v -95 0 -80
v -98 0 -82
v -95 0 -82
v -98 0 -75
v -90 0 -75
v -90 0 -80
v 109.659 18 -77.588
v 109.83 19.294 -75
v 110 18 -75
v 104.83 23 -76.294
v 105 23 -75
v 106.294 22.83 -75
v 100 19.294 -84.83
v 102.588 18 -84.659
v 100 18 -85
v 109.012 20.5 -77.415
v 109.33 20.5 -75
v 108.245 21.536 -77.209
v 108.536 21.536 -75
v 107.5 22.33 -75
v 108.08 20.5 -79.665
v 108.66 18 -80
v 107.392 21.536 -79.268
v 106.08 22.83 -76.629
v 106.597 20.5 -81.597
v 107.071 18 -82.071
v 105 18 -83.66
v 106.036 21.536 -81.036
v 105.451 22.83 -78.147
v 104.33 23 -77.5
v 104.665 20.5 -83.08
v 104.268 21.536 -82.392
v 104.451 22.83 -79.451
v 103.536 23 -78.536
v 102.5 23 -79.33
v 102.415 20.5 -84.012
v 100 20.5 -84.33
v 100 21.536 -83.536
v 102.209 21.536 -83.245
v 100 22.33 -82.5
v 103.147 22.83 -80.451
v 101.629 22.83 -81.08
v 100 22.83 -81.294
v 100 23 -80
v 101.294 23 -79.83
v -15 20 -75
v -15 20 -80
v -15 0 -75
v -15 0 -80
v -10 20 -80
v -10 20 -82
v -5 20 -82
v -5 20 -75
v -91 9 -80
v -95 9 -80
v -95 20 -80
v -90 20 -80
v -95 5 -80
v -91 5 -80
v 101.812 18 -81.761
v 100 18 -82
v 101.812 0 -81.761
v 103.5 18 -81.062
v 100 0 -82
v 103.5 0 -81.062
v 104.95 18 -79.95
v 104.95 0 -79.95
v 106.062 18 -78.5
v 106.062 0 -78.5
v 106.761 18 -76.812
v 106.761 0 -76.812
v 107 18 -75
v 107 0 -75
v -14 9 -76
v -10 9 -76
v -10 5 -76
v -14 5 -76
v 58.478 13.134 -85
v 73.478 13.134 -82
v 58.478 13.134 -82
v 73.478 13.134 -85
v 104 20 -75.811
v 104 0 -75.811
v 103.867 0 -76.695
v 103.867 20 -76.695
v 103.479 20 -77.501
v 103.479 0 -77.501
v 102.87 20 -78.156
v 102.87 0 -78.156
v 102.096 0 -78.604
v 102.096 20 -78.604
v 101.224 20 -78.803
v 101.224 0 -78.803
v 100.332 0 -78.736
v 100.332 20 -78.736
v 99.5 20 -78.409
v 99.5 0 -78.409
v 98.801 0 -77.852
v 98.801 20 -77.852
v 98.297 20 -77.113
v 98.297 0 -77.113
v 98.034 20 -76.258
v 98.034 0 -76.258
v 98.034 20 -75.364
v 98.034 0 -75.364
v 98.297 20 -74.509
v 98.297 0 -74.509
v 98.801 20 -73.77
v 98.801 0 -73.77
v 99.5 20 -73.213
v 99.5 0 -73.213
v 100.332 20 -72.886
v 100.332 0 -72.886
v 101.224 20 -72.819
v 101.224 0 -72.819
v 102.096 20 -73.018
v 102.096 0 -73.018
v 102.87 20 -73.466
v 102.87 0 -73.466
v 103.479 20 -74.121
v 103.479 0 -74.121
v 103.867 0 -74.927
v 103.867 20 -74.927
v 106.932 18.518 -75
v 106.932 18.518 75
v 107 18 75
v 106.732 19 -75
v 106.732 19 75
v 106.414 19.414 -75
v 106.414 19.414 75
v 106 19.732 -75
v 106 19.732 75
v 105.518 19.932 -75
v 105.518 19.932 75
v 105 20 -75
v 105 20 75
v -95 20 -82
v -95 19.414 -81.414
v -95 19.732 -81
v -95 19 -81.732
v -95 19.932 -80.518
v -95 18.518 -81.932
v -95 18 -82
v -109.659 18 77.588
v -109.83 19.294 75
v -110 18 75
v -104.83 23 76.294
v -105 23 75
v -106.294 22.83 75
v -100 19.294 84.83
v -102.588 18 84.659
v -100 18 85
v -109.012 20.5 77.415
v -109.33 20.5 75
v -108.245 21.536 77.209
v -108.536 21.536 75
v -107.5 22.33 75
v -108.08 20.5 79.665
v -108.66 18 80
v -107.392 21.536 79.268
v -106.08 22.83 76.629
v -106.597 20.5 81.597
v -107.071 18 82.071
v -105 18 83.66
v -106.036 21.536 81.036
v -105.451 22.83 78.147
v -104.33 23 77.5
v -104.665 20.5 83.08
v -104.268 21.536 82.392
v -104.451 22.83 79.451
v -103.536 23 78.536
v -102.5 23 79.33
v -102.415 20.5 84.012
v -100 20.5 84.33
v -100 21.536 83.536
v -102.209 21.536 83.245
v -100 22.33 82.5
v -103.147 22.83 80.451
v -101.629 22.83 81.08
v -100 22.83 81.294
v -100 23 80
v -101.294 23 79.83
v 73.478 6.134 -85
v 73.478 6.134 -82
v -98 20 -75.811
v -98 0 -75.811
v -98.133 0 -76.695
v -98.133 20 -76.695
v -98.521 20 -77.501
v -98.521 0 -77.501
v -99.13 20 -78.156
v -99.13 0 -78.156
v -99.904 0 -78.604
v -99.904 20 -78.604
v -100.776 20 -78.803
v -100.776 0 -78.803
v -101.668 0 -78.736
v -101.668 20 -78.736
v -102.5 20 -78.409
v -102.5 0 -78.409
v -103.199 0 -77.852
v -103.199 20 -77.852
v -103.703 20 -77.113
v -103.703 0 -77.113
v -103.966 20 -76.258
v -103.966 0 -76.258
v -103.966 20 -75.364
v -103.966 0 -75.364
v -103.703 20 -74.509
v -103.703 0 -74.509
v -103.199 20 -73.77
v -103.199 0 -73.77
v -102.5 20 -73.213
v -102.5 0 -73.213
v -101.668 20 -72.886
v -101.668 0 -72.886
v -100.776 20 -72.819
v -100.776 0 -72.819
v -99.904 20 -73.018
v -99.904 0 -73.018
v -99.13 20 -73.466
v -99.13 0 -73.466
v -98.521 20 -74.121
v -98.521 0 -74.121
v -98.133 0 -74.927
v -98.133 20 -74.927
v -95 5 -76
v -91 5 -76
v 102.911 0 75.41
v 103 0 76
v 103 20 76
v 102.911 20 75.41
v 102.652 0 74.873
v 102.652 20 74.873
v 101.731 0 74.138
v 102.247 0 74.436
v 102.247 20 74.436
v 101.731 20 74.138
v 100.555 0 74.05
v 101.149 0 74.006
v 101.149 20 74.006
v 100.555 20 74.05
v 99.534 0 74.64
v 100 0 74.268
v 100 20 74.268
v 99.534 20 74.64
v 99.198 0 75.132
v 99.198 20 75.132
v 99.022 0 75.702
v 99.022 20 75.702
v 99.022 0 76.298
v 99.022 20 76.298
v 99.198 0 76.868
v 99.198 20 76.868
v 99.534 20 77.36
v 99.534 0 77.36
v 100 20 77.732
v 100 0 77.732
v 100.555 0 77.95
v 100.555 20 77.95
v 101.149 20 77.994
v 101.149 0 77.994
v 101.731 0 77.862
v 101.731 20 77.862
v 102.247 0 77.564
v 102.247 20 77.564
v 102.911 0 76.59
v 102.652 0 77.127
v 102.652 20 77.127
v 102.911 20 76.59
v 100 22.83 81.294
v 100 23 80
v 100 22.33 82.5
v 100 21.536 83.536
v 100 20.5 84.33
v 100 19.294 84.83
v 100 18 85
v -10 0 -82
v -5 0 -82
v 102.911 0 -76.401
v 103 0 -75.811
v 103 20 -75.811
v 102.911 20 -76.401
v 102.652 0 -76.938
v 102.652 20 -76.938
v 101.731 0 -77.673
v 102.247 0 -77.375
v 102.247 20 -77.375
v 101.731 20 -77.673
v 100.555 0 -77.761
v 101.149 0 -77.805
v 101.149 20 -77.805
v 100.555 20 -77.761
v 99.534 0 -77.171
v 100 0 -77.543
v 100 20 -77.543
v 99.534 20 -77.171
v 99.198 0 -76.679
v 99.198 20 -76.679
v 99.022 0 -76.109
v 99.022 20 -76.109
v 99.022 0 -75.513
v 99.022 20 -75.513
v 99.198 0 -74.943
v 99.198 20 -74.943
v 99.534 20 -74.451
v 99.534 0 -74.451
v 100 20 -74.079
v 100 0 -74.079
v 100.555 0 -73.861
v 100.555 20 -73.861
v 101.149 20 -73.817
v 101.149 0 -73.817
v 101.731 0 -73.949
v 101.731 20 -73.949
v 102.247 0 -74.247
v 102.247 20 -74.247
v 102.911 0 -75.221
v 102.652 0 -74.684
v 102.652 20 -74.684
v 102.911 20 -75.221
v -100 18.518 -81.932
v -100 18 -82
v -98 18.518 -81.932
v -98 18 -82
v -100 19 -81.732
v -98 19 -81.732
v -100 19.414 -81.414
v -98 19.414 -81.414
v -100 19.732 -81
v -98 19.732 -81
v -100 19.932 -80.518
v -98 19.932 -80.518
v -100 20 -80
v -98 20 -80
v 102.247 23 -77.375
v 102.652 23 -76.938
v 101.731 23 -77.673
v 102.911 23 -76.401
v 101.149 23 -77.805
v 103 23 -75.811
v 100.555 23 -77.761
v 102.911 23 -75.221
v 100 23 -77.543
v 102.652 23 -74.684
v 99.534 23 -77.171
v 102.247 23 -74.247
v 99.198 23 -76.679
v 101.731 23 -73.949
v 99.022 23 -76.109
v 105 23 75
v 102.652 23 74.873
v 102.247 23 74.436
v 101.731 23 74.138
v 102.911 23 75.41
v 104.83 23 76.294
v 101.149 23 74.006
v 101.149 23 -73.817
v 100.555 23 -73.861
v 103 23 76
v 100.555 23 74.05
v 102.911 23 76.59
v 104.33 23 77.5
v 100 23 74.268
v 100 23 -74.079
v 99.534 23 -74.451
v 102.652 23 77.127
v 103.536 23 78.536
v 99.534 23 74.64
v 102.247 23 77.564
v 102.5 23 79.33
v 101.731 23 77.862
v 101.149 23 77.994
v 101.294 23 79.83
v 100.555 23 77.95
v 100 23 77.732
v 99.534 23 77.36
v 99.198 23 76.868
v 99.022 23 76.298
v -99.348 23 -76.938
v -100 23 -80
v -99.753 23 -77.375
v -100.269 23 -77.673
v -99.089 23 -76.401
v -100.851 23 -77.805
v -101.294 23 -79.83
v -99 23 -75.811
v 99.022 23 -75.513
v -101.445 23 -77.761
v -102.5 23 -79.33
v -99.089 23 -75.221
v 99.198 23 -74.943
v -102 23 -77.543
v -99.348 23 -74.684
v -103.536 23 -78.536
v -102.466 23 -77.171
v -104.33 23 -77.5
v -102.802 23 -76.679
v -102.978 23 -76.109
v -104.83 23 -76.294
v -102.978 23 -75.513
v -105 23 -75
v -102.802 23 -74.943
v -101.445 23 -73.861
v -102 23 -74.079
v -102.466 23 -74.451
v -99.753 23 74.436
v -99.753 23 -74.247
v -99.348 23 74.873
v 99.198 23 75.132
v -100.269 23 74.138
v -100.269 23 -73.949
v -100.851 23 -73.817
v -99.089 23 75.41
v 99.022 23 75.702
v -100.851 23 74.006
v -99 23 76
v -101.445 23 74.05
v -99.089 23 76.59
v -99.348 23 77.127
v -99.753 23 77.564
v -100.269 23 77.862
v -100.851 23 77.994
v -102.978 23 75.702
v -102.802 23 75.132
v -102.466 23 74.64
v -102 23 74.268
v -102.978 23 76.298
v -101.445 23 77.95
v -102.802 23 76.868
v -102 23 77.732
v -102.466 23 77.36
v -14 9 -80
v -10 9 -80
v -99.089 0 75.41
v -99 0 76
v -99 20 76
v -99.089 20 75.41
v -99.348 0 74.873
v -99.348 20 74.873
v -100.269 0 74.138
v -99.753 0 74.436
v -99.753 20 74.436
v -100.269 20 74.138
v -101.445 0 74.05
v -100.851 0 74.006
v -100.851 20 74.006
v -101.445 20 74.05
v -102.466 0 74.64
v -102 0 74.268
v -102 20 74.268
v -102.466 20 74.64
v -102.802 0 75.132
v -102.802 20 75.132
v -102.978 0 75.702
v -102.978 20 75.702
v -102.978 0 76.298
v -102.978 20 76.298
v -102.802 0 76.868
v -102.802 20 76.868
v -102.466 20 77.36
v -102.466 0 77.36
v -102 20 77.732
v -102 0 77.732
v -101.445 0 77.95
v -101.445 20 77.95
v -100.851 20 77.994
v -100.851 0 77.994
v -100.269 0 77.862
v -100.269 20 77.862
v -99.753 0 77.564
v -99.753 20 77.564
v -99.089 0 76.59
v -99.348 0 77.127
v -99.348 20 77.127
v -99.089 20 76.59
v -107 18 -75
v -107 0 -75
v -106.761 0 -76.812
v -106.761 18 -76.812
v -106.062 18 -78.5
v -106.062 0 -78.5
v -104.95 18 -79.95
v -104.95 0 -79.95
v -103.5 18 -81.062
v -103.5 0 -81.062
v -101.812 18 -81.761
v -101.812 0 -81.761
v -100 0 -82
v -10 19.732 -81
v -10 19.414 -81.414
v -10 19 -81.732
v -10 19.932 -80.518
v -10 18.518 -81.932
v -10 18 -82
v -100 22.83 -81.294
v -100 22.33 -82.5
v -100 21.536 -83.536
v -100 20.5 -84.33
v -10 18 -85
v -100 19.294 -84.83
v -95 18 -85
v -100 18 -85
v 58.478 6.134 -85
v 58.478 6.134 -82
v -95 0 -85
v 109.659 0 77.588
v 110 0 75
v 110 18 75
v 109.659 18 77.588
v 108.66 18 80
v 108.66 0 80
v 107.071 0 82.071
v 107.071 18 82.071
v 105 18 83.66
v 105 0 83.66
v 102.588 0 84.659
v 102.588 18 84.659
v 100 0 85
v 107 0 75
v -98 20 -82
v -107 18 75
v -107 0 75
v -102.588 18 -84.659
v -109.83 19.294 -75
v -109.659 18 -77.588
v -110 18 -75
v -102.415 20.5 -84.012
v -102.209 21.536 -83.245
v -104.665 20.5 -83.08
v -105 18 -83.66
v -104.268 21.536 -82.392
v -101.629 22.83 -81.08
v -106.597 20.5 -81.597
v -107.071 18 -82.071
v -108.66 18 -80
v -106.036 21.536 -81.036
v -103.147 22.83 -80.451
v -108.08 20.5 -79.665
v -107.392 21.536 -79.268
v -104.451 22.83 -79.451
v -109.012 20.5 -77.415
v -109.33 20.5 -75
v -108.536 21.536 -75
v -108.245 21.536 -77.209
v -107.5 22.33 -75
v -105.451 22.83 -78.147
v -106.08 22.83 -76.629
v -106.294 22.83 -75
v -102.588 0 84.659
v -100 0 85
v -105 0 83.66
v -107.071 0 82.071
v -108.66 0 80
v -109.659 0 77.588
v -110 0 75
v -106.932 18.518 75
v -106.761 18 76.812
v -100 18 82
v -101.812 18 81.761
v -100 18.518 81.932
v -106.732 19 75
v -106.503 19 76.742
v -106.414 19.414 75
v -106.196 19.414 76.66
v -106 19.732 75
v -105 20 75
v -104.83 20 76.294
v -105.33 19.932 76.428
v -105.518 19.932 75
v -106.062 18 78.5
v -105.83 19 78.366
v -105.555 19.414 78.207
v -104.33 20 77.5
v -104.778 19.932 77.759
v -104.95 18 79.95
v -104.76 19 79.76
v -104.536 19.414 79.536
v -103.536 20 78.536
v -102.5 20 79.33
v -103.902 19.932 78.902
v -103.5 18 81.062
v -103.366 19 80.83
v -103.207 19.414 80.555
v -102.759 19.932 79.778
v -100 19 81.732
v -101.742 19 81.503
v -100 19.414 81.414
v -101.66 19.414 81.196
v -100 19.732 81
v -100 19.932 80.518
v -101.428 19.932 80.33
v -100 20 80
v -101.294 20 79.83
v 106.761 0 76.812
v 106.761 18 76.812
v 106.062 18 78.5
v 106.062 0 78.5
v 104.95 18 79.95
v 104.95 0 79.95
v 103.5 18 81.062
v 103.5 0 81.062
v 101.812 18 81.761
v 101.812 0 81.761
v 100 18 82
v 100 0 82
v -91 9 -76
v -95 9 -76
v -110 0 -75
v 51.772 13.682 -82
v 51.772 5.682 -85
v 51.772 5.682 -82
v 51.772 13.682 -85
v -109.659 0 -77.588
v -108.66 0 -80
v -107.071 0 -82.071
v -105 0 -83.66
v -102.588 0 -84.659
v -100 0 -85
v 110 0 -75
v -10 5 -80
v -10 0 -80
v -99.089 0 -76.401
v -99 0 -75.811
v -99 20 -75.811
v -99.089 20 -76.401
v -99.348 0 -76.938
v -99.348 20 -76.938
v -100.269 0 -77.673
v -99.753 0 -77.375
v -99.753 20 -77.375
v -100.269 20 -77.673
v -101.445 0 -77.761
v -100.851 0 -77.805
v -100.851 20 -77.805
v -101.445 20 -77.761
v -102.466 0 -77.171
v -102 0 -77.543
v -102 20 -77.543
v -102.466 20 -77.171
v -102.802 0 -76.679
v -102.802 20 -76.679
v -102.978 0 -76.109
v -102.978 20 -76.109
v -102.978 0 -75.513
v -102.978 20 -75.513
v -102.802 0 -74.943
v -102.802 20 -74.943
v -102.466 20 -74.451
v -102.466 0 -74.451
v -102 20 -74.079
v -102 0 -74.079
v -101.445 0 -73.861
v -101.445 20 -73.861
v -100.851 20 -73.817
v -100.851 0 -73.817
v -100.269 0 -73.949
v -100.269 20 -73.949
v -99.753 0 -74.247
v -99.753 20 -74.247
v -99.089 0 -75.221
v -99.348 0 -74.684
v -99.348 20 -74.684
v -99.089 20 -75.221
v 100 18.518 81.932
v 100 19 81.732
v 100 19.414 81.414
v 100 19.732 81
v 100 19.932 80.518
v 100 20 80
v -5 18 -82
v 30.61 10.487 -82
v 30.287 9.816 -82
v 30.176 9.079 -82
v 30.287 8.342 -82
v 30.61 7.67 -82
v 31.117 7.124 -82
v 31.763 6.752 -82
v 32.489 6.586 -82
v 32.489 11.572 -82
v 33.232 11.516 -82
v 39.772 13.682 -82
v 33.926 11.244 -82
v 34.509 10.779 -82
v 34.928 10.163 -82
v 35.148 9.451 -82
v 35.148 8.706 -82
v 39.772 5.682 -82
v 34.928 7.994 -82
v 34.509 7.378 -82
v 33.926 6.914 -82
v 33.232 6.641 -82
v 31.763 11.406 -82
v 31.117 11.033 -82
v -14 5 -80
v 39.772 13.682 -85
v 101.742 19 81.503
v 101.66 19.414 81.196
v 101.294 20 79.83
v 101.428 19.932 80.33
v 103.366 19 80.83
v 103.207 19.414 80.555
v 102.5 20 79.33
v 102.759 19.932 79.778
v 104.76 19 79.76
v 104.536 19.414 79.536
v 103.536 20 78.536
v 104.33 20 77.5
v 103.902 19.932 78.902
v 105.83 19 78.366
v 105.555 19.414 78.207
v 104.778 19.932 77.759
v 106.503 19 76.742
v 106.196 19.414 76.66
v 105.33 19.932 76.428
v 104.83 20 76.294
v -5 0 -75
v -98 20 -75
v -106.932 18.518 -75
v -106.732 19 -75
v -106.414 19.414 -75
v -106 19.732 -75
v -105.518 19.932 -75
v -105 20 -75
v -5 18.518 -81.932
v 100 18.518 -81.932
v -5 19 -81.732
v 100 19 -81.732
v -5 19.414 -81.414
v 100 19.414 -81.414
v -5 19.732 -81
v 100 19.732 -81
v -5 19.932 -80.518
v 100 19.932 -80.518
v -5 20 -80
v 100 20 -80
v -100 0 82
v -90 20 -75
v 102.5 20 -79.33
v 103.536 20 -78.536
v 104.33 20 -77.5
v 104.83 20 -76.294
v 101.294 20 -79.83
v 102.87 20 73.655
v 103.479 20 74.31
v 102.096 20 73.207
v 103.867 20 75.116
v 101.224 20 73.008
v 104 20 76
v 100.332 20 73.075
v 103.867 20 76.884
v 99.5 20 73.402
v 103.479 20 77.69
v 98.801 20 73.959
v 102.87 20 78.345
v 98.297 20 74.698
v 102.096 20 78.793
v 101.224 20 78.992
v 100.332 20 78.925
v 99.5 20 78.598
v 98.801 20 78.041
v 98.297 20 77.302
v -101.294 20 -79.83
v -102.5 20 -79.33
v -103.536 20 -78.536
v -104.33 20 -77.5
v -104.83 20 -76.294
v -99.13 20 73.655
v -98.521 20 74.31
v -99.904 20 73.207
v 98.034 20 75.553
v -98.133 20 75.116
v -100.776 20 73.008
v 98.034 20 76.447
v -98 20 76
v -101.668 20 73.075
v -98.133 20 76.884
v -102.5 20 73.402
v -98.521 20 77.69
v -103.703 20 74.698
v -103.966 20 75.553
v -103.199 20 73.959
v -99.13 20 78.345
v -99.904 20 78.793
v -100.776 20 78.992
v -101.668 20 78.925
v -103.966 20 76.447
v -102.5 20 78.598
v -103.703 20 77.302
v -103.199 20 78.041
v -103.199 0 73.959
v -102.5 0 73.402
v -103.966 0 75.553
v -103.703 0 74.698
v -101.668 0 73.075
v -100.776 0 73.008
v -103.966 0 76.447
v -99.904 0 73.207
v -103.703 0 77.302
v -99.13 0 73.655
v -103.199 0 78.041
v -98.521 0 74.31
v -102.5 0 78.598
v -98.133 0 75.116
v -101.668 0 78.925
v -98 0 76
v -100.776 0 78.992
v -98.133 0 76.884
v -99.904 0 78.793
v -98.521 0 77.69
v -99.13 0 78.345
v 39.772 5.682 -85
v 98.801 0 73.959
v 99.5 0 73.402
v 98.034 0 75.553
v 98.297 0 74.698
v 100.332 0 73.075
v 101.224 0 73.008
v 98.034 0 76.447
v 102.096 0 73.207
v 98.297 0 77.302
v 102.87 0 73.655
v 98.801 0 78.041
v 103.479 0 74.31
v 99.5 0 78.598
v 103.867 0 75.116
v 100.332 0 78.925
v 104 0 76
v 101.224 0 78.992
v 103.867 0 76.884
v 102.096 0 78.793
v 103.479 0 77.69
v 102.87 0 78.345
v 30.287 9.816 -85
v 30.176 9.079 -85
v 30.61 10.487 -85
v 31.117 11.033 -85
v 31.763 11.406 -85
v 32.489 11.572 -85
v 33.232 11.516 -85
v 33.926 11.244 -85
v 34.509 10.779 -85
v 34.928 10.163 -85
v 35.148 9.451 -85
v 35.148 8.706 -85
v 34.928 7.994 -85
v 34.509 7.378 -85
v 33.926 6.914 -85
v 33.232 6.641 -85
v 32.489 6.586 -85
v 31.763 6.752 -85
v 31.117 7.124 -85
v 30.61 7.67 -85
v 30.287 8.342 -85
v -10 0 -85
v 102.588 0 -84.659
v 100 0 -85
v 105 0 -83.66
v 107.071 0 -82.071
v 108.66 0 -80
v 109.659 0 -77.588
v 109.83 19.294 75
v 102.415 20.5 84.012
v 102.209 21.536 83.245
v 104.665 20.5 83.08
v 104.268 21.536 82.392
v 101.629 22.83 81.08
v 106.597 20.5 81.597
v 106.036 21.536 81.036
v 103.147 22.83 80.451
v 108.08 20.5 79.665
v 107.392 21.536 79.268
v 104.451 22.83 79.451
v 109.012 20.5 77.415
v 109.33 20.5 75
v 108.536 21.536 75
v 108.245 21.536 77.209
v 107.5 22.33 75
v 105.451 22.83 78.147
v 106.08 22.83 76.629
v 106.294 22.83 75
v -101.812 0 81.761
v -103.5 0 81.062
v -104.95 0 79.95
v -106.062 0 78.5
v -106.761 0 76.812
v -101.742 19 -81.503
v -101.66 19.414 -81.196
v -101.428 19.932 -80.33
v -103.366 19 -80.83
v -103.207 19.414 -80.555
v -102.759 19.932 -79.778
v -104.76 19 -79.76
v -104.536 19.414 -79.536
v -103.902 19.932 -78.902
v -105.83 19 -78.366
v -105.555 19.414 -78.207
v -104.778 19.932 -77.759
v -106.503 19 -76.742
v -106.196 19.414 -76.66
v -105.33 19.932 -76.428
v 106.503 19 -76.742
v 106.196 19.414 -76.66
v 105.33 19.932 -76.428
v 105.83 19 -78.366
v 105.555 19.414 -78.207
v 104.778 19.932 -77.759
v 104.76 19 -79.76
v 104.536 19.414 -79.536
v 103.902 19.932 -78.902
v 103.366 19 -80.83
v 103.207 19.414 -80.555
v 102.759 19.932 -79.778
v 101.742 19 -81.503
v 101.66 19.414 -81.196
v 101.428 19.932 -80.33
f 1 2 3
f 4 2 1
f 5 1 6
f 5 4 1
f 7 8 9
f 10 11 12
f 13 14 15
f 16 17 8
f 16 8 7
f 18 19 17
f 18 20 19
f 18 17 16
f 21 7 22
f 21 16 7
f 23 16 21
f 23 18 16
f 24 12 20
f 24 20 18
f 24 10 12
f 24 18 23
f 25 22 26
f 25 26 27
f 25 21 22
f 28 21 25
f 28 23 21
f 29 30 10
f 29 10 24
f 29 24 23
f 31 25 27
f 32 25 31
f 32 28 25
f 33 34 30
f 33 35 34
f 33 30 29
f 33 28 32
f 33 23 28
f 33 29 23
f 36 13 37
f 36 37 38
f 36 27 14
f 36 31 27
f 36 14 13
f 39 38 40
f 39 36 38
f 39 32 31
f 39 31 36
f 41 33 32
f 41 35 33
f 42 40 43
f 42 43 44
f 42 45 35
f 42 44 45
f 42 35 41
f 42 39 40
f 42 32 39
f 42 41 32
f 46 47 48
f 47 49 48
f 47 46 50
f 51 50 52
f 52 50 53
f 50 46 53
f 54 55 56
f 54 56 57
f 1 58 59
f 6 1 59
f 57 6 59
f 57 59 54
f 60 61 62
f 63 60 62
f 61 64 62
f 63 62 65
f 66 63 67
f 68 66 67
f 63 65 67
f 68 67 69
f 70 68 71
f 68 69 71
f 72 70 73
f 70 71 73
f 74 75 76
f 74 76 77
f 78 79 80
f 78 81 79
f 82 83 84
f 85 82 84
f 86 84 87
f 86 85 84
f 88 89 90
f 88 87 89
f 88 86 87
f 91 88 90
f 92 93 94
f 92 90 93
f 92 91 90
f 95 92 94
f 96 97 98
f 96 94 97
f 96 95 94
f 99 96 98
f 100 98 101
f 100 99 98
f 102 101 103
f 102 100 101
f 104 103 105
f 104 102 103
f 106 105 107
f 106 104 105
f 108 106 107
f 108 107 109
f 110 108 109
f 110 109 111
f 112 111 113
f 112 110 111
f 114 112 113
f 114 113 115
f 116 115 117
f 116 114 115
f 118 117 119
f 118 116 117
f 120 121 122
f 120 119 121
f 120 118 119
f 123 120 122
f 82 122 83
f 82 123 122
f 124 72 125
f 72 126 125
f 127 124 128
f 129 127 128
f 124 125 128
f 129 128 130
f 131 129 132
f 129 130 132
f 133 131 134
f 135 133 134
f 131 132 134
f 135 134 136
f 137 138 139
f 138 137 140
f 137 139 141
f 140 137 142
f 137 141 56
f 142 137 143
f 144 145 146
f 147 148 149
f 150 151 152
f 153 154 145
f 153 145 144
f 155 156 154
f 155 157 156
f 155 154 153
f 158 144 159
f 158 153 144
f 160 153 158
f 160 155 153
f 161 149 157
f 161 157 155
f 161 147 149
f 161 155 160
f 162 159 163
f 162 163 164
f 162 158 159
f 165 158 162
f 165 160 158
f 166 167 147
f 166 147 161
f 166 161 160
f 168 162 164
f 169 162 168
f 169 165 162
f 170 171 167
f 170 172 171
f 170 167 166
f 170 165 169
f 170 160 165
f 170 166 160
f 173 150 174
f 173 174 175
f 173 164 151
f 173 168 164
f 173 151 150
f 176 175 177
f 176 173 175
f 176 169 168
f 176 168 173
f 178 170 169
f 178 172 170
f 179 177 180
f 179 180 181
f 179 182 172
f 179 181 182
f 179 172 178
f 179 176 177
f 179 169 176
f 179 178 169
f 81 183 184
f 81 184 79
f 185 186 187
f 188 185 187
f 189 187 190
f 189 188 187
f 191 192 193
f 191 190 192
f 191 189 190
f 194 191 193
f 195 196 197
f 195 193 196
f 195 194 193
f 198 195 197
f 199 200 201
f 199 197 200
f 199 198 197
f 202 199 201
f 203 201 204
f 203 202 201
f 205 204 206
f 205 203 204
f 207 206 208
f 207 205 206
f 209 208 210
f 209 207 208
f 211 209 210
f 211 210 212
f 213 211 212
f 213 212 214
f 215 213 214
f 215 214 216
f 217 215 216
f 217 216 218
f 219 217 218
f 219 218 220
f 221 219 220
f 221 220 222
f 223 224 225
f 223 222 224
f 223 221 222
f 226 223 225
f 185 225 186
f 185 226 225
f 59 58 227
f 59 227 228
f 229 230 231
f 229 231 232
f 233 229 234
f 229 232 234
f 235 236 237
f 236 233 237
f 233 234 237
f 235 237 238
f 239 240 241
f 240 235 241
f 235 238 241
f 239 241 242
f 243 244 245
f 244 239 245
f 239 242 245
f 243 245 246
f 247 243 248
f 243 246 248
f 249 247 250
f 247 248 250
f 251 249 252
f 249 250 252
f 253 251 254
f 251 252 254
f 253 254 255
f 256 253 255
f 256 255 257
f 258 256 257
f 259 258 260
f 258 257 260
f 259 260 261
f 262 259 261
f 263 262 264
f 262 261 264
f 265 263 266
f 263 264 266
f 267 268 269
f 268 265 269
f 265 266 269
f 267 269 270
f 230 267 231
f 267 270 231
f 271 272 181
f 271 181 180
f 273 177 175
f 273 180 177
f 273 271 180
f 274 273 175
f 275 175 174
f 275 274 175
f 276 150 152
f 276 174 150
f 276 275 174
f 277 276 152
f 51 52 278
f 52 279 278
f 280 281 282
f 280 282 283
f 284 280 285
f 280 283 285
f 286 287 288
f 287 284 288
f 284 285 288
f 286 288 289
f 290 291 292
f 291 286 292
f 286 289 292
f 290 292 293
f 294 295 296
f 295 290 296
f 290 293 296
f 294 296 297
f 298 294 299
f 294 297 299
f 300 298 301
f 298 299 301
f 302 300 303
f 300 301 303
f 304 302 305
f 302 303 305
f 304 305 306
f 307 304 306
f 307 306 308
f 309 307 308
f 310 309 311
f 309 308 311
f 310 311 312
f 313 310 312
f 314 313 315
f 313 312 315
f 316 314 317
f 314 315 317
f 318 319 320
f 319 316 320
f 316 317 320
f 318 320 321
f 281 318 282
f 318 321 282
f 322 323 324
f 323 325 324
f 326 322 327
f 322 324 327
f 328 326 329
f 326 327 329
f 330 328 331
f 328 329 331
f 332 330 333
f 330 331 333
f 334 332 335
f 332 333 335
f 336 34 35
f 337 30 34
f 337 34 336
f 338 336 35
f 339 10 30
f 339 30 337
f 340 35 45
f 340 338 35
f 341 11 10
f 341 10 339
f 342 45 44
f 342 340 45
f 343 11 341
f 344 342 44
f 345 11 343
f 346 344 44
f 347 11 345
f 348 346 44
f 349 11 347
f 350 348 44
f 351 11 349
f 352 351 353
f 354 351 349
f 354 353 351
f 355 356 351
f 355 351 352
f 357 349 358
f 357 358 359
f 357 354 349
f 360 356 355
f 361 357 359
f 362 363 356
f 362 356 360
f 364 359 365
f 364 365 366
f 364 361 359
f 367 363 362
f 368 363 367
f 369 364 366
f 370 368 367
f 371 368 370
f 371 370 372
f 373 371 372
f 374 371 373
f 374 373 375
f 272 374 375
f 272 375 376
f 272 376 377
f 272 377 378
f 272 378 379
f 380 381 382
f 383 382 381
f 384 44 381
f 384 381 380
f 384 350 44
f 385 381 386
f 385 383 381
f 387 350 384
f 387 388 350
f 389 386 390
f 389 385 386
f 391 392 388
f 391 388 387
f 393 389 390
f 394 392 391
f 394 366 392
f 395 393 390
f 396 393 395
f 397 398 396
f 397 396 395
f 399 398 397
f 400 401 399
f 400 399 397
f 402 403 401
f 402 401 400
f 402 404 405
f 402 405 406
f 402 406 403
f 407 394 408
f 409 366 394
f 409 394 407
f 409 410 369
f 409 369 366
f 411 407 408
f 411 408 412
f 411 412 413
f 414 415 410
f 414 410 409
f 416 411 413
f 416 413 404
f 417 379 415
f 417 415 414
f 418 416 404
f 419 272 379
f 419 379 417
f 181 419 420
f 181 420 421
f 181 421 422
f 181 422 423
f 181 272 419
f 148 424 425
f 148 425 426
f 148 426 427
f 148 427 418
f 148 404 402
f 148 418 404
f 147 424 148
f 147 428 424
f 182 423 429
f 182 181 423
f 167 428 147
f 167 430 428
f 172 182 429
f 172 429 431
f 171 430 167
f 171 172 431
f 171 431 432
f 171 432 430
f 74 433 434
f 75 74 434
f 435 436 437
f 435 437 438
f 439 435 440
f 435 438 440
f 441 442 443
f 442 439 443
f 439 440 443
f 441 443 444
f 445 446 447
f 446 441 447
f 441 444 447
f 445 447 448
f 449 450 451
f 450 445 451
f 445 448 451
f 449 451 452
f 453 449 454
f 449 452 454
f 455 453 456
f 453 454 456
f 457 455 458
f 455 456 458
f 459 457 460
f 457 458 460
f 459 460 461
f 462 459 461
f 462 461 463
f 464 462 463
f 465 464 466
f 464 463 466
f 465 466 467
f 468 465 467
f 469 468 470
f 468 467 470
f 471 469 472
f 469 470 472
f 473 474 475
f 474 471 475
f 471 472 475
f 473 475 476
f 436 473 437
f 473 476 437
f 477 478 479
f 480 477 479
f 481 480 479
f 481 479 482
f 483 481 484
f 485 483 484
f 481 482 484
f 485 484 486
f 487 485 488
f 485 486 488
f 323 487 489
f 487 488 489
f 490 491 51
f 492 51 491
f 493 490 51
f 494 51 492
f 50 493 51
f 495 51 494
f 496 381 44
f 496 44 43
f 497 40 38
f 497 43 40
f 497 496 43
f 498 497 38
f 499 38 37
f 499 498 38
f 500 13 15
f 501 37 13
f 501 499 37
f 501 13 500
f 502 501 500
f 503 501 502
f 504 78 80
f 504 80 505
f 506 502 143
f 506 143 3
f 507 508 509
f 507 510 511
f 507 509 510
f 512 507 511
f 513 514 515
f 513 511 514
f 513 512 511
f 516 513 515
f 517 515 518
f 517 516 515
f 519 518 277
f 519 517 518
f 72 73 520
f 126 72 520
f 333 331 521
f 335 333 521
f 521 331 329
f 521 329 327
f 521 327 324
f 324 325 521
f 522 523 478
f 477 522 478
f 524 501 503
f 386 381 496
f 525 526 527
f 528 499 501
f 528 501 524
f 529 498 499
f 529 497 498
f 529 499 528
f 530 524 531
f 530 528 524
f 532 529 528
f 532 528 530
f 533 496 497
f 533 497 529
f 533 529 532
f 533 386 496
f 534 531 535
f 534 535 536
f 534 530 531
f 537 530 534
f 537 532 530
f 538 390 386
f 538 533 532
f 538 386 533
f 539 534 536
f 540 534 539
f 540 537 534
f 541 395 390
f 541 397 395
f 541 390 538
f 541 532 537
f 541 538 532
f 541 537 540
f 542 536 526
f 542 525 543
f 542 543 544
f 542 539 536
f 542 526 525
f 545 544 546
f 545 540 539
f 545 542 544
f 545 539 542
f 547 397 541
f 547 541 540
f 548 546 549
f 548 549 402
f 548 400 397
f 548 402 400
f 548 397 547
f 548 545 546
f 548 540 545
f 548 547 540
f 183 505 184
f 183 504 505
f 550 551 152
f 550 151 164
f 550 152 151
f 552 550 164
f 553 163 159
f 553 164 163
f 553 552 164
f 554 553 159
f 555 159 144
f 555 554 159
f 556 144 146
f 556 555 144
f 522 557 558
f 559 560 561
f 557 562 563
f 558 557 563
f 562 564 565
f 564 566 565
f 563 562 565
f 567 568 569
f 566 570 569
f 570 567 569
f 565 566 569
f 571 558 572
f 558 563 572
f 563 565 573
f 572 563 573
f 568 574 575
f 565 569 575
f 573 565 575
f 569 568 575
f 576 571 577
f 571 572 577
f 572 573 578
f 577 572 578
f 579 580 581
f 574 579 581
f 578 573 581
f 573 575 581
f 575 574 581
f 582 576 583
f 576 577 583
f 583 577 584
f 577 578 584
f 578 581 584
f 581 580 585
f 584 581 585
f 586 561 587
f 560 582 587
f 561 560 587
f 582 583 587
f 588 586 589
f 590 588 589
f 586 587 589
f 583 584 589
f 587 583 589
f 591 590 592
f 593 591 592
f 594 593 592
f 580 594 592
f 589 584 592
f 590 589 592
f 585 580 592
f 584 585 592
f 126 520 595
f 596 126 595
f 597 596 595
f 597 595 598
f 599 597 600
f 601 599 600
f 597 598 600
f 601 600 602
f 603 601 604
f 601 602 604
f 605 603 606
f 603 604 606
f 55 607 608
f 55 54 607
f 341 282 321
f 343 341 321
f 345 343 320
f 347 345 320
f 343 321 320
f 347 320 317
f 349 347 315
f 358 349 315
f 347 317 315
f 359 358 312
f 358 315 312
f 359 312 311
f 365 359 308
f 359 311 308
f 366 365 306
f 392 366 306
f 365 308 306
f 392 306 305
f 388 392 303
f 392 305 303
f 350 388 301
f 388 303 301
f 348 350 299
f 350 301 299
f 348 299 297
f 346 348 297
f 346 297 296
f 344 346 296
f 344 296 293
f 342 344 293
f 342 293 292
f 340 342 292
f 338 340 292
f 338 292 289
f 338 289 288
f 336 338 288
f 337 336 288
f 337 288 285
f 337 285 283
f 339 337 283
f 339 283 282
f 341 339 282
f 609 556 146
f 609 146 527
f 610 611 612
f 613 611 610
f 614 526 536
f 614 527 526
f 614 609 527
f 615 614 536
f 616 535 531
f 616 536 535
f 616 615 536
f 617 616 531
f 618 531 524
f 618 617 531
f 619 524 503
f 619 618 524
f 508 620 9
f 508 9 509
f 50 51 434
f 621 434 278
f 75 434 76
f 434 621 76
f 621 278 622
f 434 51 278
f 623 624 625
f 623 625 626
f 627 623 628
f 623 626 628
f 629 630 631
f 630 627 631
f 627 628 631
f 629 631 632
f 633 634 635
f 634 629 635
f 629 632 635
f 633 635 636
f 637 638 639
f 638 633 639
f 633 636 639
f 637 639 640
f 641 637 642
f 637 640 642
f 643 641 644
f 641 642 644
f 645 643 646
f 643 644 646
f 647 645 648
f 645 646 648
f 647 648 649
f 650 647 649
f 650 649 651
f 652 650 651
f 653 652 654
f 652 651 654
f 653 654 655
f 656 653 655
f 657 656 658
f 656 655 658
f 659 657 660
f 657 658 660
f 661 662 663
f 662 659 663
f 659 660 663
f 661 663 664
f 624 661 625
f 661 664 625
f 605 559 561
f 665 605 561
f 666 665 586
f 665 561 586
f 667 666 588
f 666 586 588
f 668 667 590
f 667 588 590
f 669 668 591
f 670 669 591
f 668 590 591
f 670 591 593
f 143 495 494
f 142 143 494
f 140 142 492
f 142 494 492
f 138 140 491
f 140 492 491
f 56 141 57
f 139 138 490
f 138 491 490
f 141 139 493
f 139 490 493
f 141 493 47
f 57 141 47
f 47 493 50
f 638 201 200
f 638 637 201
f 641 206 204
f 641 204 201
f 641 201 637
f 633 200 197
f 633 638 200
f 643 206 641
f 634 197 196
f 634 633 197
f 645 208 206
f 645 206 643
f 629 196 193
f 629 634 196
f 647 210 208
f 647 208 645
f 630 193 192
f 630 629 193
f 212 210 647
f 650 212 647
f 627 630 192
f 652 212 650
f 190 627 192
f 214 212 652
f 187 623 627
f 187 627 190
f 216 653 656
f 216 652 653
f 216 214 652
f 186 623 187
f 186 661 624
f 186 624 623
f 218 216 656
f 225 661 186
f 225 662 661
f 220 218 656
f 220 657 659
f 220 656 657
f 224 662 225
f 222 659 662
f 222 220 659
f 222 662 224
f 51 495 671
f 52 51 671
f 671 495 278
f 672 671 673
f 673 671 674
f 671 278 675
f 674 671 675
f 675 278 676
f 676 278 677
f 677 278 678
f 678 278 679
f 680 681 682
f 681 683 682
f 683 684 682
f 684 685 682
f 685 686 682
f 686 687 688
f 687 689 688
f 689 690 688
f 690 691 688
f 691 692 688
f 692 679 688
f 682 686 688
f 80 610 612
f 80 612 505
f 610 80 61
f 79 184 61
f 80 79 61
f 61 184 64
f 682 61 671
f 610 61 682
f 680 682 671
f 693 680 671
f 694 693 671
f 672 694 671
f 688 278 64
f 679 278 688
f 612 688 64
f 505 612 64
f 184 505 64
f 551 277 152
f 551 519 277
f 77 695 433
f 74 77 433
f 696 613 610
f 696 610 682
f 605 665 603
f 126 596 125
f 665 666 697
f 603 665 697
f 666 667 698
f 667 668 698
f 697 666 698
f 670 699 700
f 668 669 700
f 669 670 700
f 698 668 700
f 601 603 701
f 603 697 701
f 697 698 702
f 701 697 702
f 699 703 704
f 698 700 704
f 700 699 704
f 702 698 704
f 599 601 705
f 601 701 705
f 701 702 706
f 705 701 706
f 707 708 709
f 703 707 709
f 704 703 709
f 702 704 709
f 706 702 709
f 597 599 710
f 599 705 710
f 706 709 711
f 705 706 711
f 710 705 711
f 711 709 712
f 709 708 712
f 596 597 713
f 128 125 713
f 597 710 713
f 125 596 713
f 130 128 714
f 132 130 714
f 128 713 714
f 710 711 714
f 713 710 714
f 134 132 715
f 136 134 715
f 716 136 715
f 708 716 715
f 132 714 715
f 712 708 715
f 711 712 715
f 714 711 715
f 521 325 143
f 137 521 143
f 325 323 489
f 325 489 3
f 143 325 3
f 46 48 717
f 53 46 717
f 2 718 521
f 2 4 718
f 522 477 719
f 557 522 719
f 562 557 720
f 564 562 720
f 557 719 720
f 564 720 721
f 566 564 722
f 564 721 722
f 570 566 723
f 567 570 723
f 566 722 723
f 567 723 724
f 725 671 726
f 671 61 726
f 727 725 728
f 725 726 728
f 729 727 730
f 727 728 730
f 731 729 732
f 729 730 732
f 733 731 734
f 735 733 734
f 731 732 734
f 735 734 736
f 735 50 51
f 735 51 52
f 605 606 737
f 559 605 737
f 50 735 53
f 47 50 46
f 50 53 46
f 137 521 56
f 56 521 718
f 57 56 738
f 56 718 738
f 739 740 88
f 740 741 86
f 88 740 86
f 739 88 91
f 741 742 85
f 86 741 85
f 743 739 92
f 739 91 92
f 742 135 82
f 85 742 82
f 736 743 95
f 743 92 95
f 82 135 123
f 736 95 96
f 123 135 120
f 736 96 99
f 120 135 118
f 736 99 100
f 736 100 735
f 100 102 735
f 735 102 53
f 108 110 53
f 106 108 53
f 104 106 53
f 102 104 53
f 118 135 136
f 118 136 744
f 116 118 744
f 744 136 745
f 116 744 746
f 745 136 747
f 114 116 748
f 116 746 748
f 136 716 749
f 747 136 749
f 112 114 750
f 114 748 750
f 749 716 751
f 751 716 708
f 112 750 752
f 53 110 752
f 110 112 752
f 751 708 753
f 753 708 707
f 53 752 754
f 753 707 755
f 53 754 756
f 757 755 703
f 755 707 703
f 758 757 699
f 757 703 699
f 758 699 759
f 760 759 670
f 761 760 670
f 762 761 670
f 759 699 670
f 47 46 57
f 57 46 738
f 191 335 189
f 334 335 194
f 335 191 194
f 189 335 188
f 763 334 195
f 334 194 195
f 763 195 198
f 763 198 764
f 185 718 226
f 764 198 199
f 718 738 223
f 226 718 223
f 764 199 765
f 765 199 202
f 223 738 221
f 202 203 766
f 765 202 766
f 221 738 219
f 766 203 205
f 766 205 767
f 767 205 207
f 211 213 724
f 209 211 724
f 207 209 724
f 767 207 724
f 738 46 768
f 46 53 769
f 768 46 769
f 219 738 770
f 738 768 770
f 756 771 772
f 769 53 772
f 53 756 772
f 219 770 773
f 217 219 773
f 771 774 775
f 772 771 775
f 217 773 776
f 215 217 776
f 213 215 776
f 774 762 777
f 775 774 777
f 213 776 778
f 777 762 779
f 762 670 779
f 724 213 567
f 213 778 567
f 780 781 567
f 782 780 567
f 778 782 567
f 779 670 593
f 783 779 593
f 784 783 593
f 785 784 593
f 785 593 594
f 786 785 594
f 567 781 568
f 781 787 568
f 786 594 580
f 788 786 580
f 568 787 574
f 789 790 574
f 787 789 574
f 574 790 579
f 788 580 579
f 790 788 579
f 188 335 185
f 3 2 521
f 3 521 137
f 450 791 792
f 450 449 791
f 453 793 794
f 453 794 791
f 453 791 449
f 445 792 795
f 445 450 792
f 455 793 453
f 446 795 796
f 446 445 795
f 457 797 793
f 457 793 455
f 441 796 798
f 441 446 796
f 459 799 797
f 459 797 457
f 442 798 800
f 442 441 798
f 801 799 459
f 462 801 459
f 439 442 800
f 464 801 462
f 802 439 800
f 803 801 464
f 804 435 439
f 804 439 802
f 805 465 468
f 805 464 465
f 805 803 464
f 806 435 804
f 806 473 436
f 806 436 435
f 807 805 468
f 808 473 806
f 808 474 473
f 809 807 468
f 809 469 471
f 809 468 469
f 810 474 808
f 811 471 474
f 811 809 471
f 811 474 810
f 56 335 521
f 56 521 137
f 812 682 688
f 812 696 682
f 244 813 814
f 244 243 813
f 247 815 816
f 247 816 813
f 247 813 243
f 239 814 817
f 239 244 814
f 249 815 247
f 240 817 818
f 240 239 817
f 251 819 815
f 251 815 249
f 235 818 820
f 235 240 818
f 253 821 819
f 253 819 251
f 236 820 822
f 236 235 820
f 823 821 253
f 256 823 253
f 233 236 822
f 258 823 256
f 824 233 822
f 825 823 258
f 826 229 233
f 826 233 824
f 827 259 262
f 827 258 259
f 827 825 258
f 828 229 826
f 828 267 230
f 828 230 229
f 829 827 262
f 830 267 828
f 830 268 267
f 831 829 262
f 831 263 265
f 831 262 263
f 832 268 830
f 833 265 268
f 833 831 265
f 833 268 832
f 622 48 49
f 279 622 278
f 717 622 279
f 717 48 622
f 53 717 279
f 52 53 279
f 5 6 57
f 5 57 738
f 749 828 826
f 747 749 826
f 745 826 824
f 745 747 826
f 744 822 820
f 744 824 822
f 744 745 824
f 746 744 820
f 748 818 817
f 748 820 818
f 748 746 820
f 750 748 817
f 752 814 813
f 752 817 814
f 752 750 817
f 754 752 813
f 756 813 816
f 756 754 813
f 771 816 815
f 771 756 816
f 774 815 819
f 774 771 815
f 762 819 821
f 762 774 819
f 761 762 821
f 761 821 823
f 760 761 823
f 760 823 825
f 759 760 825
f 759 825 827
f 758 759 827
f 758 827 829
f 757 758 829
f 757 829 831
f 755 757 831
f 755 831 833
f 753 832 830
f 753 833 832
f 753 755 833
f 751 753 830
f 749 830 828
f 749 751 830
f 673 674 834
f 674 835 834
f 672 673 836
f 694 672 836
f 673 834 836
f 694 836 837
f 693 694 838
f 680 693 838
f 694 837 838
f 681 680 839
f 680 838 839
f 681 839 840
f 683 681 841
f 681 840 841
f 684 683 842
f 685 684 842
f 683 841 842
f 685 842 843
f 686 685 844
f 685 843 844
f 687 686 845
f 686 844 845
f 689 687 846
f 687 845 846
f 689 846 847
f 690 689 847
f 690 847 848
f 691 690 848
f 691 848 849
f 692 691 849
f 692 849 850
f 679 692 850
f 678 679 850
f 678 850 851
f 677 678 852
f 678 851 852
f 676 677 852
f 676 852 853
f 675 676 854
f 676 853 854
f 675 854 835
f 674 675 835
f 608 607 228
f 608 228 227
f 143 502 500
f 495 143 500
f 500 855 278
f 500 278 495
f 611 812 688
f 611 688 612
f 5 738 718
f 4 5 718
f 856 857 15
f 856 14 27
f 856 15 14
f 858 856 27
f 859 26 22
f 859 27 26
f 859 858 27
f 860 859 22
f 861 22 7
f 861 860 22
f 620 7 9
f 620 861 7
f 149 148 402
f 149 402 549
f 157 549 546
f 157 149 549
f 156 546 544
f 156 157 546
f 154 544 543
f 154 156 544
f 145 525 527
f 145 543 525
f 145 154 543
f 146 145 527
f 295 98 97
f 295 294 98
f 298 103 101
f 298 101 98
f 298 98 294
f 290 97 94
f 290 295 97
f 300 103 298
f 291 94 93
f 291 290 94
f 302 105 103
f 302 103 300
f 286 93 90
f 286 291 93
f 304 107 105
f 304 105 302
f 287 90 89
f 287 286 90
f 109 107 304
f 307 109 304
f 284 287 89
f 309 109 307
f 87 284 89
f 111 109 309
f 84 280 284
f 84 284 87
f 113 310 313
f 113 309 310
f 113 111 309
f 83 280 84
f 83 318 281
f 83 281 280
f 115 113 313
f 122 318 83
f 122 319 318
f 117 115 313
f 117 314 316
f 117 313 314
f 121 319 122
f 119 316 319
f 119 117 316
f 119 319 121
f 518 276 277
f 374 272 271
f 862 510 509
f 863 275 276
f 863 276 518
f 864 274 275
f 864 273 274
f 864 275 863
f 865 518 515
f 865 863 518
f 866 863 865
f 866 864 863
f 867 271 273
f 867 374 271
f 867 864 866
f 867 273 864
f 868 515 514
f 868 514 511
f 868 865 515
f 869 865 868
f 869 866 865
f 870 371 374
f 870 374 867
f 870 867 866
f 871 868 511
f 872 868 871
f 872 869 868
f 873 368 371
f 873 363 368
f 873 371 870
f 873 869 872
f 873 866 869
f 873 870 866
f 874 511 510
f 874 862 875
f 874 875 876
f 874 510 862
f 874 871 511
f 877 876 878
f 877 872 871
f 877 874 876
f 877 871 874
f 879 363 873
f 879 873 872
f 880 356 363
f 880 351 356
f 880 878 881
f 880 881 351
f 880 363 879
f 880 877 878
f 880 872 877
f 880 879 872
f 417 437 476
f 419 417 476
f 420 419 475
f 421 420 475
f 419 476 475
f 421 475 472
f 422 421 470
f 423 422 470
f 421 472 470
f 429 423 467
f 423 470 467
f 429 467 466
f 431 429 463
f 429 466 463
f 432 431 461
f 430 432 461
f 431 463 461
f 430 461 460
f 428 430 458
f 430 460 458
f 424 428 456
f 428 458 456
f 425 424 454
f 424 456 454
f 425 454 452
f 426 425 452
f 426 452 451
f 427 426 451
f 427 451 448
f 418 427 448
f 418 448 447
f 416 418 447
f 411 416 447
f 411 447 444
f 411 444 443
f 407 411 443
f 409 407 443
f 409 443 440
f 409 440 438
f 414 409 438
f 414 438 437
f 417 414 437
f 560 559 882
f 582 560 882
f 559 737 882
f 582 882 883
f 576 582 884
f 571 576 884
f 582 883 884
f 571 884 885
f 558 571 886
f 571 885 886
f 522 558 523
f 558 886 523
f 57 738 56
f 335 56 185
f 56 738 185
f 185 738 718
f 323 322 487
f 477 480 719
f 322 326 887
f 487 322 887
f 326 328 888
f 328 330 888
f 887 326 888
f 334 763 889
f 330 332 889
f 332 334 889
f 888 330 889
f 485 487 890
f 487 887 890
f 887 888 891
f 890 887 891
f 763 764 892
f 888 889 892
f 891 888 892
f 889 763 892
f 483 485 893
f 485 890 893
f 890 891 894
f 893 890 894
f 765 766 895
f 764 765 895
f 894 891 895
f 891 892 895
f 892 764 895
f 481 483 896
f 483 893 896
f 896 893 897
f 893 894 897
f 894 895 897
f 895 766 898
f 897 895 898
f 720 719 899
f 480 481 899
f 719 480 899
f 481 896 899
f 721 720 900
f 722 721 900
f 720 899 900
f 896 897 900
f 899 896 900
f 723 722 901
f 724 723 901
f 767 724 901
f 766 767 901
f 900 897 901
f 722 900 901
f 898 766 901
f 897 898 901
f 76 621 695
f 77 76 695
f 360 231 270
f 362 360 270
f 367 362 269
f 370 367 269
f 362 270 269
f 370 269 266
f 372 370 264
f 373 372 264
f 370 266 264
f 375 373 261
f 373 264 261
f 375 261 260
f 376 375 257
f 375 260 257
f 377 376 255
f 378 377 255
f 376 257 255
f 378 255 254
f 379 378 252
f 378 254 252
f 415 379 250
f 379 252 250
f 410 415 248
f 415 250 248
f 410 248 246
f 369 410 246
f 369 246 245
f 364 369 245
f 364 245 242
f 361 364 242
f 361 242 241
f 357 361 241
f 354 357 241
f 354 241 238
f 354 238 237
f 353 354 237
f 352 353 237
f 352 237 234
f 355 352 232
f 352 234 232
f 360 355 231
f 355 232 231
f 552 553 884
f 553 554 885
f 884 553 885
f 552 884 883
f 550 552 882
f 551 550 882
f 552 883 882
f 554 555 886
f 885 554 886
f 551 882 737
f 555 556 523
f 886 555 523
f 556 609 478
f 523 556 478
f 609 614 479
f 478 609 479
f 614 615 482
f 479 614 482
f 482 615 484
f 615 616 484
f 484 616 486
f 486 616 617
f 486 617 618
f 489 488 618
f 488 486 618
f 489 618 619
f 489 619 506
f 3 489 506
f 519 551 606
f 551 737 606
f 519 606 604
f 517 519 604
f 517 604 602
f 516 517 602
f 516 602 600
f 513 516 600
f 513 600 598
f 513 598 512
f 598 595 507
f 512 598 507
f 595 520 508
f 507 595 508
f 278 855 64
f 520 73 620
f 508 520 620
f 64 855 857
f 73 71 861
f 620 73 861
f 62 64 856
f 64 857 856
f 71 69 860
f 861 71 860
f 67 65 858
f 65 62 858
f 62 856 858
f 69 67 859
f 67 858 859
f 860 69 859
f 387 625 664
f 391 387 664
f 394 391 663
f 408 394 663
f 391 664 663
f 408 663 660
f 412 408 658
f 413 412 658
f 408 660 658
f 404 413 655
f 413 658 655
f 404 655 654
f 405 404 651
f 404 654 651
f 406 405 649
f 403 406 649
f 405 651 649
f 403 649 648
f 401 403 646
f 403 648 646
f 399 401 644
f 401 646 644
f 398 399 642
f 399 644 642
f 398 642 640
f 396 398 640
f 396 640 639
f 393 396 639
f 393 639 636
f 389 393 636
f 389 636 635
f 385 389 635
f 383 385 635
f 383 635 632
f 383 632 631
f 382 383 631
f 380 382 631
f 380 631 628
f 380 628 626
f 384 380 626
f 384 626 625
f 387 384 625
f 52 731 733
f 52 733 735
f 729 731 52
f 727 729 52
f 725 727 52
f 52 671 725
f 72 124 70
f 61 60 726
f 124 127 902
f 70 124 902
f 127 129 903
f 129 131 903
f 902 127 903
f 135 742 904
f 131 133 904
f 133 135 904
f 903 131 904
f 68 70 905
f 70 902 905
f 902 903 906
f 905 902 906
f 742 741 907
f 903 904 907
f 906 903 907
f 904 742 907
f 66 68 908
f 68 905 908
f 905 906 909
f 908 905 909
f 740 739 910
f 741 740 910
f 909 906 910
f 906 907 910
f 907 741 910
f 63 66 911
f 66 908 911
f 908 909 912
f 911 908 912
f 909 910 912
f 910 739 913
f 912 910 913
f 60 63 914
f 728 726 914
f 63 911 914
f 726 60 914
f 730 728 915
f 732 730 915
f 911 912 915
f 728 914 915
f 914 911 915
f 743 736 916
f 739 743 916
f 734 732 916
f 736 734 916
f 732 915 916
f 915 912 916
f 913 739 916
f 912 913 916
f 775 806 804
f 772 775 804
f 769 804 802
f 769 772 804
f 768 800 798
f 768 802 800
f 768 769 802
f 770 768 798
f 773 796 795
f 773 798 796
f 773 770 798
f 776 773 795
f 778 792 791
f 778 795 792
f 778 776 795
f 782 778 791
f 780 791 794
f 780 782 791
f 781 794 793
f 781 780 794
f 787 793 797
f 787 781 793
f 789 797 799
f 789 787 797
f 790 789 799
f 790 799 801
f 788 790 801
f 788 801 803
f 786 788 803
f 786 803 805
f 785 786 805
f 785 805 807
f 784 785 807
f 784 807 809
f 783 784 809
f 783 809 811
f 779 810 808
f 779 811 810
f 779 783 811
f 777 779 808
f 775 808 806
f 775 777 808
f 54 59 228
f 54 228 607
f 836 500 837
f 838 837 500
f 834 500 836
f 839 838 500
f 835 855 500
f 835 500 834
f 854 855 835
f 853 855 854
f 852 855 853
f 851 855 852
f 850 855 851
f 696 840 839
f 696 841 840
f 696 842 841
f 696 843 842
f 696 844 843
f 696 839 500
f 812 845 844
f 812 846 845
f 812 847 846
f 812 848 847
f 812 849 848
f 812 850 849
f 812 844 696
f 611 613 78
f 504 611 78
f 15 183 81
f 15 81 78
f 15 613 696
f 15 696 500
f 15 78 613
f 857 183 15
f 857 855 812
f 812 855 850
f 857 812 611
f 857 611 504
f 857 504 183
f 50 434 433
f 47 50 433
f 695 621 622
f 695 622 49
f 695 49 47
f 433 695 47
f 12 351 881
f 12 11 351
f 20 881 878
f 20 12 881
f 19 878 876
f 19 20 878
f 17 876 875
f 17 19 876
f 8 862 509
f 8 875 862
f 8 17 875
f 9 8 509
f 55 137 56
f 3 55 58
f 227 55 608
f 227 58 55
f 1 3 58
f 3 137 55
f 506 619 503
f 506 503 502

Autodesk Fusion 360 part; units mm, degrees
sketch "Esquisse1" plane through (0, 0, 0) normal (0, 1, 0) x (1, 0, 0)
  line L0 (-100, 85) -> (100, 85)
  line L1 (110, 75) -> (110, -75)
  line L2 (100, -85) -> (-100, -85)
  line L3 (-110, -75) -> (-110, 75)
  line L4 (-110, 85) -> (110, -85) construction
  line L5 (110, 85) -> (-110, -85) construction
  arc A0 (-100, 85) -> (-110, 75) centre (-100, 75) ccw
  arc A1 (110, 75) -> (100, 85) centre (100, 75) ccw
  arc A2 (100, -85) -> (110, -75) centre (100, -75) ccw
  arc A3 (-110, -75) -> (-100, -85) centre (-100, -75) ccw
  arc A4 (-100, 82) -> (-107, 75) centre (-100, 75) ccw
  line L6 (-107, -75) -> (-107, 75)
  arc A5 (-107, -75) -> (-100, -82) centre (-100, -75) ccw
  line L7 (100, -82) -> (-100, -82)
  arc A6 (100, -82) -> (107, -75) centre (100, -75) ccw
  line L8 (107, 75) -> (107, -75)
  arc A7 (107, 75) -> (100, 82) centre (100, 75) ccw
  line L9 (-100, 82) -> (100, 82)
  dimension "d8" = 170
  dimension "d9" = 220
  dimension "d10" = 10
  dimension "d11" = 3
extrude "Extrusion2" add sketch "Esquisse1" along normal blind 20 makes body 1
sketch "Esquisse2" plane through (0, 20, 0) normal (0, 1, 0) x (-1, 0, 0)
  arc A0 (107, 75) -> (100, 82) centre (100, 75) ccw
  line L0 (107, 75) -> (107, -75)
  arc A1 (100, -82) -> (107, -75) centre (100, -75) ccw
  line L1 (100, -82) -> (-100, -82)
  arc A2 (-107, -75) -> (-100, -82) centre (-100, -75) ccw
  line L2 (-107, -75) -> (-107, 75)
  arc A3 (-100, 82) -> (-107, 75) centre (-100, 75) ccw
  line L3 (-100, 82) -> (100, 82)
  arc A4 (100, -85) -> (110, -75) centre (100, -75) ccw
  line L4 (110, -75) -> (110, 75)
  arc A5 (110, 75) -> (100, 85) centre (100, 75) ccw
  line L5 (100, 85) -> (-100, 85)
  arc A6 (-100, 85) -> (-110, 75) centre (-100, 75) ccw
  line L6 (-110, 75) -> (-110, -75)
  arc A7 (-110, -75) -> (-100, -85) centre (-100, -75) ccw
  line L7 (-100, -85) -> (100, -85)
  line L8 (-110, 75) -> (-110, -75)
  arc A8 (-100, 85) -> (-110, 75) centre (-100, 75) ccw
  line L9 (100, 85) -> (-100, 85)
  circle A9 centre (100, 75) radius 0.001
  line L10 (110, -75) -> (110, 75)
  arc A10 (100, -85) -> (110, -75) centre (100, -75) ccw
  line L11 (-100, -85) -> (100, -85)
  circle A11 centre (-100, -75) radius 0.001
extrude "Extrusion3" add sketch "Esquisse2" along normal blind 3 contours A0 L0 A1 L1 A2 L2 A3 L3 | A4 L4 A5 L5 A6 L6 A7 L7 L8 A8 L9 L10 A10 L11 | A9 | A11 bodies 1
fillet "Congé1" radius 2 8 edges at (0, 20, -82) (104.9497, 20, -79.9497) (107, 20, 0) (104.9497, 20, 79.9497) (0, 20, 82) (-104.9497, 20, 79.9497) (-107, 20, 0) (-104.9497, 20, -79.9497) on bodies 1
fillet "Congé2" radius 5 8 edges at (0, 23, 85) (107.0711, 23, 82.0711) (110, 23, 0) (107.0711, 23, -82.0711) (0, 23, -85) (-107.0711, 23, -82.0711) (-110, 23, 0) (-107.0711, 23, 82.0711) on bodies 1
sketch "Esquisse3" plane through (0, 0, -85) normal (0, 0, -1) x (-1, 0, 0)
  line L0 (100, 18) -> (-100, 18)
  line L1 (-100, 18) -> (-100, 0)
  line L2 (-100, 0) -> (100, 0)
  line L3 (100, 0) -> (100, 18)
  line L4 (-58.4785, 6.134) -> (-73.4785, 6.134)
  line L5 (-73.4785, 6.134) -> (-73.4785, 13.134)
  line L6 (-73.4785, 13.134) -> (-58.4785, 13.134)
  line L7 (-58.4785, 13.134) -> (-58.4785, 6.134)
  line L8 (-39.7725, 5.6821) -> (-51.7725, 5.6821)
  line L9 (-51.7725, 5.6821) -> (-51.7725, 13.6821)
  line L10 (-51.7725, 13.6821) -> (-39.7725, 13.6821)
  line L11 (-39.7725, 13.6821) -> (-39.7725, 5.6821)
  circle A0 centre (-32.676, 9.0787) radius 2.5
  dimension "d20" = 15
  dimension "d21" = 7
  dimension "d24" = 12
  dimension "d25" = 8
  dimension "d26" = 5
extrude "Extrusion4" cut sketch "Esquisse3" against normal blind 30 contours L4 L5 L6 L7 | L8 L9 L10 L11 | A0 bodies 1
sketch "Esquisse4" plane through (0, 0, 0) normal (0, -1, 0) x (1, 0, 0)
  arc A0 (-100, 82) -> (-107, 75) centre (-100, 75) ccw
  line L0 (-100, 82) -> (100, 82)
  arc A1 (107, 75) -> (100, 82) centre (100, 75) ccw
  line L1 (107, 75) -> (107, -75)
  arc A2 (100, -82) -> (107, -75) centre (100, -75) ccw
  line L2 (100, -82) -> (-100, -82)
  arc A3 (-107, -75) -> (-100, -82) centre (-100, -75) ccw
  line L3 (-107, -75) -> (-107, 75)
  arc A4 (-110, -75) -> (-100, -85) centre (-100, -75) ccw
  line L4 (-100, -85) -> (100, -85)
  arc A5 (100, -85) -> (110, -75) centre (100, -75) ccw
  line L5 (110, -75) -> (110, 75)
  arc A6 (110, 75) -> (100, 85) centre (100, 75) ccw
  line L6 (100, 85) -> (-100, 85)
  arc A7 (-100, 85) -> (-110, 75) centre (-100, 75) ccw
  line L7 (-110, 75) -> (-110, -75)
sketch "Esquisse5" plane through (0, 20, 0) normal (0, -1, 0) x (1, 0, 0)
  line L0 (-100, -80) -> (100, -80)
  line L1 (105, -75) -> (105, 75)
  line L2 (100, 80) -> (-100, 80)
  line L3 (-105, 75) -> (-105, -75)
  circle A0 centre (-101, 76) radius 2
  circle A1 centre (-101, 76) radius 2
  circle A2 centre (-101, 76) radius 3
  line L4 (0, 100) -> (0, -84.8494) construction
  line L5 (-132.4366, 0.0945) -> (95, 0.0945) construction
  circle A3 centre (101, 76) radius 3
  circle A4 centre (101, 76) radius 2
  circle A5 centre (101, -75.811) radius 3
  circle A6 centre (101, -75.811) radius 2
  circle A7 centre (-101, -75.811) radius 3
  circle A8 centre (-101, -75.811) radius 2
  arc A9 (100, -80) -> (105, -75) centre (100, -75) ccw
  arc A10 (105, 75) -> (100, 80) centre (100, 75) ccw
  arc A11 (-100, 80) -> (-105, 75) centre (-100, 75) ccw
  arc A12 (-105, -75) -> (-100, -80) centre (-100, -75) ccw
  point P0 (-101, -75.811)
  dimension "d27" = 4
  dimension "d28" = 4
  dimension "d29" = 6
  dimension "d30" = 4
  dimension "d31" = 4
  dimension "d32" = 4
  dimension "d33" = 4
extrude "Extrusion5" add sketch "Esquisse5" along normal up to surface (20 mm away) contours A2 | A3 | A5 | A7 bodies 1
extrude "Extrusion6" cut sketch "Esquisse5" against normal blind 55 contours A0 A1 | A4 | A6 | A8 bodies 1
sketch "Esquisse6" plane through (0, 0, -85) normal (0, 0, -1) x (-1, 0, 0)
  line L0 (-73.4785, 6.134) -> (-73.4785, 13.134)
  line L1 (-73.4785, 13.134) -> (-58.4785, 13.134)
  line L2 (-58.4785, 13.134) -> (-58.4785, 6.134)
  line L3 (-58.4785, 6.134) -> (-73.4785, 6.134)
  line L4 (-51.7725, 5.6821) -> (-51.7725, 13.6821)
  line L5 (-51.7725, 13.6821) -> (-39.7725, 13.6821)
  line L6 (-39.7725, 13.6821) -> (-39.7725, 5.6821)
  line L7 (-39.7725, 5.6821) -> (-51.7725, 5.6821)
  circle A0 centre (-32.676, 9.0787) radius 2.5
  line L8 (100, 18) -> (-100, 18)
  line L9 (-100, 18) -> (-100, 0)
  line L10 (-100, 0) -> (100, 0)
  line L11 (100, 0) -> (100, 18)
  line L12 (95, 0) -> (10, 0)
  line L13 (10, 0) -> (10, 18)
  line L14 (10, 18) -> (95, 18)
  line L15 (95, 18) -> (95, 0)
  dimension "d39" = 85
  dimension "d45" = 5
extrude "Extrusion7" cut sketch "Esquisse6" against normal blind 25 contours L8 L10 L12 L13 L14 L15 bodies 1
sketch "Esquisse7" plane through (0, 0, 0) normal (0, -1, 0) x (1, 0, 0)
  line L0 (-95, -85) -> (-95, -82)
  line L1 (-95, -82) -> (-100, -82)
  arc A0 (-107, -75) -> (-100, -82) centre (-100, -75) ccw
  line L2 (-107, -75) -> (-107, 75)
  arc A1 (-100, 82) -> (-107, 75) centre (-100, 75) ccw
  line L3 (-100, 82) -> (100, 82)
  arc A2 (107, 75) -> (100, 82) centre (100, 75) ccw
  line L4 (107, 75) -> (107, -75)
  arc A3 (100, -82) -> (107, -75) centre (100, -75) ccw
  line L5 (100, -82) -> (-10, -82)
  line L6 (-10, -82) -> (-10, -85)
  line L7 (-10, -85) -> (100, -85)
  arc A4 (100, -85) -> (110, -75) centre (100, -75) ccw
  line L8 (110, -75) -> (110, 75)
  arc A5 (110, 75) -> (100, 85) centre (100, 75) ccw
  line L9 (100, 85) -> (-100, 85)
  arc A6 (-100, 85) -> (-110, 75) centre (-100, 75) ccw
  line L10 (-110, 75) -> (-110, -75)
  arc A7 (-110, -75) -> (-100, -85) centre (-100, -75) ccw
  line L11 (-100, -85) -> (-95, -85)
sketch "Esquisse8" plane through (0, 0, 0) normal (0, -1, 0) x (1, 0, 0)
  line L0 (-95, -82) -> (-95, -80)
  line L1 (-95, -80) -> (-90, -80)
  line L2 (-90, -80) -> (-90, -75)
  line L3 (-90, -75) -> (-98, -75)
  line L4 (-98, -75) -> (-98, -82)
  line L5 (-98, -82) -> (-95, -82)
  line L6 (-10, -82) -> (-10, -80)
  line L7 (-10, -80) -> (-15, -80)
  line L8 (-15, -80) -> (-15, -75)
  line L9 (-15, -75) -> (-5, -75)
  line L10 (-5, -75) -> (-5, -82)
  line L11 (-5, -82) -> (-10, -82)
extrude "Extrusion9" cut sketch "Esquisse8" against normal up to surface (20 mm away) bodies 1
extrude "Extrusion10" add sketch "Esquisse8" against normal up to surface (20 mm away) separate body makes body 2 at (-92.6667, 6.6667, -75) makes body 3 at (-11.6667, 13.3333, -75)
sketch "Esquisse9" plane through (0, 0, -80) normal (0, 0, -1) x (-1, 0, 0)
  line L0 (95, 20) -> (90, 20)
  line L1 (90, 20) -> (90, 0)
  line L2 (90, 0) -> (95, 0)
  line L3 (95, 0) -> (95, 20)
  line L4 (95, 5) -> (91, 5)
  line L5 (91, 5) -> (91, 9)
  line L6 (91, 9) -> (95, 9)
  line L7 (95, 9) -> (95, 5)
  line L8 (10, 5) -> (14, 5)
  line L9 (14, 5) -> (14, 9)
  line L10 (14, 9) -> (10, 9)
  line L11 (10, 9) -> (10, 5)
extrude "Extrusion11" cut sketch "Esquisse9" against normal blind 4 contours L3 L4 L5 L6 L7 | L8 L9 L10 L11 bodies 2 3
